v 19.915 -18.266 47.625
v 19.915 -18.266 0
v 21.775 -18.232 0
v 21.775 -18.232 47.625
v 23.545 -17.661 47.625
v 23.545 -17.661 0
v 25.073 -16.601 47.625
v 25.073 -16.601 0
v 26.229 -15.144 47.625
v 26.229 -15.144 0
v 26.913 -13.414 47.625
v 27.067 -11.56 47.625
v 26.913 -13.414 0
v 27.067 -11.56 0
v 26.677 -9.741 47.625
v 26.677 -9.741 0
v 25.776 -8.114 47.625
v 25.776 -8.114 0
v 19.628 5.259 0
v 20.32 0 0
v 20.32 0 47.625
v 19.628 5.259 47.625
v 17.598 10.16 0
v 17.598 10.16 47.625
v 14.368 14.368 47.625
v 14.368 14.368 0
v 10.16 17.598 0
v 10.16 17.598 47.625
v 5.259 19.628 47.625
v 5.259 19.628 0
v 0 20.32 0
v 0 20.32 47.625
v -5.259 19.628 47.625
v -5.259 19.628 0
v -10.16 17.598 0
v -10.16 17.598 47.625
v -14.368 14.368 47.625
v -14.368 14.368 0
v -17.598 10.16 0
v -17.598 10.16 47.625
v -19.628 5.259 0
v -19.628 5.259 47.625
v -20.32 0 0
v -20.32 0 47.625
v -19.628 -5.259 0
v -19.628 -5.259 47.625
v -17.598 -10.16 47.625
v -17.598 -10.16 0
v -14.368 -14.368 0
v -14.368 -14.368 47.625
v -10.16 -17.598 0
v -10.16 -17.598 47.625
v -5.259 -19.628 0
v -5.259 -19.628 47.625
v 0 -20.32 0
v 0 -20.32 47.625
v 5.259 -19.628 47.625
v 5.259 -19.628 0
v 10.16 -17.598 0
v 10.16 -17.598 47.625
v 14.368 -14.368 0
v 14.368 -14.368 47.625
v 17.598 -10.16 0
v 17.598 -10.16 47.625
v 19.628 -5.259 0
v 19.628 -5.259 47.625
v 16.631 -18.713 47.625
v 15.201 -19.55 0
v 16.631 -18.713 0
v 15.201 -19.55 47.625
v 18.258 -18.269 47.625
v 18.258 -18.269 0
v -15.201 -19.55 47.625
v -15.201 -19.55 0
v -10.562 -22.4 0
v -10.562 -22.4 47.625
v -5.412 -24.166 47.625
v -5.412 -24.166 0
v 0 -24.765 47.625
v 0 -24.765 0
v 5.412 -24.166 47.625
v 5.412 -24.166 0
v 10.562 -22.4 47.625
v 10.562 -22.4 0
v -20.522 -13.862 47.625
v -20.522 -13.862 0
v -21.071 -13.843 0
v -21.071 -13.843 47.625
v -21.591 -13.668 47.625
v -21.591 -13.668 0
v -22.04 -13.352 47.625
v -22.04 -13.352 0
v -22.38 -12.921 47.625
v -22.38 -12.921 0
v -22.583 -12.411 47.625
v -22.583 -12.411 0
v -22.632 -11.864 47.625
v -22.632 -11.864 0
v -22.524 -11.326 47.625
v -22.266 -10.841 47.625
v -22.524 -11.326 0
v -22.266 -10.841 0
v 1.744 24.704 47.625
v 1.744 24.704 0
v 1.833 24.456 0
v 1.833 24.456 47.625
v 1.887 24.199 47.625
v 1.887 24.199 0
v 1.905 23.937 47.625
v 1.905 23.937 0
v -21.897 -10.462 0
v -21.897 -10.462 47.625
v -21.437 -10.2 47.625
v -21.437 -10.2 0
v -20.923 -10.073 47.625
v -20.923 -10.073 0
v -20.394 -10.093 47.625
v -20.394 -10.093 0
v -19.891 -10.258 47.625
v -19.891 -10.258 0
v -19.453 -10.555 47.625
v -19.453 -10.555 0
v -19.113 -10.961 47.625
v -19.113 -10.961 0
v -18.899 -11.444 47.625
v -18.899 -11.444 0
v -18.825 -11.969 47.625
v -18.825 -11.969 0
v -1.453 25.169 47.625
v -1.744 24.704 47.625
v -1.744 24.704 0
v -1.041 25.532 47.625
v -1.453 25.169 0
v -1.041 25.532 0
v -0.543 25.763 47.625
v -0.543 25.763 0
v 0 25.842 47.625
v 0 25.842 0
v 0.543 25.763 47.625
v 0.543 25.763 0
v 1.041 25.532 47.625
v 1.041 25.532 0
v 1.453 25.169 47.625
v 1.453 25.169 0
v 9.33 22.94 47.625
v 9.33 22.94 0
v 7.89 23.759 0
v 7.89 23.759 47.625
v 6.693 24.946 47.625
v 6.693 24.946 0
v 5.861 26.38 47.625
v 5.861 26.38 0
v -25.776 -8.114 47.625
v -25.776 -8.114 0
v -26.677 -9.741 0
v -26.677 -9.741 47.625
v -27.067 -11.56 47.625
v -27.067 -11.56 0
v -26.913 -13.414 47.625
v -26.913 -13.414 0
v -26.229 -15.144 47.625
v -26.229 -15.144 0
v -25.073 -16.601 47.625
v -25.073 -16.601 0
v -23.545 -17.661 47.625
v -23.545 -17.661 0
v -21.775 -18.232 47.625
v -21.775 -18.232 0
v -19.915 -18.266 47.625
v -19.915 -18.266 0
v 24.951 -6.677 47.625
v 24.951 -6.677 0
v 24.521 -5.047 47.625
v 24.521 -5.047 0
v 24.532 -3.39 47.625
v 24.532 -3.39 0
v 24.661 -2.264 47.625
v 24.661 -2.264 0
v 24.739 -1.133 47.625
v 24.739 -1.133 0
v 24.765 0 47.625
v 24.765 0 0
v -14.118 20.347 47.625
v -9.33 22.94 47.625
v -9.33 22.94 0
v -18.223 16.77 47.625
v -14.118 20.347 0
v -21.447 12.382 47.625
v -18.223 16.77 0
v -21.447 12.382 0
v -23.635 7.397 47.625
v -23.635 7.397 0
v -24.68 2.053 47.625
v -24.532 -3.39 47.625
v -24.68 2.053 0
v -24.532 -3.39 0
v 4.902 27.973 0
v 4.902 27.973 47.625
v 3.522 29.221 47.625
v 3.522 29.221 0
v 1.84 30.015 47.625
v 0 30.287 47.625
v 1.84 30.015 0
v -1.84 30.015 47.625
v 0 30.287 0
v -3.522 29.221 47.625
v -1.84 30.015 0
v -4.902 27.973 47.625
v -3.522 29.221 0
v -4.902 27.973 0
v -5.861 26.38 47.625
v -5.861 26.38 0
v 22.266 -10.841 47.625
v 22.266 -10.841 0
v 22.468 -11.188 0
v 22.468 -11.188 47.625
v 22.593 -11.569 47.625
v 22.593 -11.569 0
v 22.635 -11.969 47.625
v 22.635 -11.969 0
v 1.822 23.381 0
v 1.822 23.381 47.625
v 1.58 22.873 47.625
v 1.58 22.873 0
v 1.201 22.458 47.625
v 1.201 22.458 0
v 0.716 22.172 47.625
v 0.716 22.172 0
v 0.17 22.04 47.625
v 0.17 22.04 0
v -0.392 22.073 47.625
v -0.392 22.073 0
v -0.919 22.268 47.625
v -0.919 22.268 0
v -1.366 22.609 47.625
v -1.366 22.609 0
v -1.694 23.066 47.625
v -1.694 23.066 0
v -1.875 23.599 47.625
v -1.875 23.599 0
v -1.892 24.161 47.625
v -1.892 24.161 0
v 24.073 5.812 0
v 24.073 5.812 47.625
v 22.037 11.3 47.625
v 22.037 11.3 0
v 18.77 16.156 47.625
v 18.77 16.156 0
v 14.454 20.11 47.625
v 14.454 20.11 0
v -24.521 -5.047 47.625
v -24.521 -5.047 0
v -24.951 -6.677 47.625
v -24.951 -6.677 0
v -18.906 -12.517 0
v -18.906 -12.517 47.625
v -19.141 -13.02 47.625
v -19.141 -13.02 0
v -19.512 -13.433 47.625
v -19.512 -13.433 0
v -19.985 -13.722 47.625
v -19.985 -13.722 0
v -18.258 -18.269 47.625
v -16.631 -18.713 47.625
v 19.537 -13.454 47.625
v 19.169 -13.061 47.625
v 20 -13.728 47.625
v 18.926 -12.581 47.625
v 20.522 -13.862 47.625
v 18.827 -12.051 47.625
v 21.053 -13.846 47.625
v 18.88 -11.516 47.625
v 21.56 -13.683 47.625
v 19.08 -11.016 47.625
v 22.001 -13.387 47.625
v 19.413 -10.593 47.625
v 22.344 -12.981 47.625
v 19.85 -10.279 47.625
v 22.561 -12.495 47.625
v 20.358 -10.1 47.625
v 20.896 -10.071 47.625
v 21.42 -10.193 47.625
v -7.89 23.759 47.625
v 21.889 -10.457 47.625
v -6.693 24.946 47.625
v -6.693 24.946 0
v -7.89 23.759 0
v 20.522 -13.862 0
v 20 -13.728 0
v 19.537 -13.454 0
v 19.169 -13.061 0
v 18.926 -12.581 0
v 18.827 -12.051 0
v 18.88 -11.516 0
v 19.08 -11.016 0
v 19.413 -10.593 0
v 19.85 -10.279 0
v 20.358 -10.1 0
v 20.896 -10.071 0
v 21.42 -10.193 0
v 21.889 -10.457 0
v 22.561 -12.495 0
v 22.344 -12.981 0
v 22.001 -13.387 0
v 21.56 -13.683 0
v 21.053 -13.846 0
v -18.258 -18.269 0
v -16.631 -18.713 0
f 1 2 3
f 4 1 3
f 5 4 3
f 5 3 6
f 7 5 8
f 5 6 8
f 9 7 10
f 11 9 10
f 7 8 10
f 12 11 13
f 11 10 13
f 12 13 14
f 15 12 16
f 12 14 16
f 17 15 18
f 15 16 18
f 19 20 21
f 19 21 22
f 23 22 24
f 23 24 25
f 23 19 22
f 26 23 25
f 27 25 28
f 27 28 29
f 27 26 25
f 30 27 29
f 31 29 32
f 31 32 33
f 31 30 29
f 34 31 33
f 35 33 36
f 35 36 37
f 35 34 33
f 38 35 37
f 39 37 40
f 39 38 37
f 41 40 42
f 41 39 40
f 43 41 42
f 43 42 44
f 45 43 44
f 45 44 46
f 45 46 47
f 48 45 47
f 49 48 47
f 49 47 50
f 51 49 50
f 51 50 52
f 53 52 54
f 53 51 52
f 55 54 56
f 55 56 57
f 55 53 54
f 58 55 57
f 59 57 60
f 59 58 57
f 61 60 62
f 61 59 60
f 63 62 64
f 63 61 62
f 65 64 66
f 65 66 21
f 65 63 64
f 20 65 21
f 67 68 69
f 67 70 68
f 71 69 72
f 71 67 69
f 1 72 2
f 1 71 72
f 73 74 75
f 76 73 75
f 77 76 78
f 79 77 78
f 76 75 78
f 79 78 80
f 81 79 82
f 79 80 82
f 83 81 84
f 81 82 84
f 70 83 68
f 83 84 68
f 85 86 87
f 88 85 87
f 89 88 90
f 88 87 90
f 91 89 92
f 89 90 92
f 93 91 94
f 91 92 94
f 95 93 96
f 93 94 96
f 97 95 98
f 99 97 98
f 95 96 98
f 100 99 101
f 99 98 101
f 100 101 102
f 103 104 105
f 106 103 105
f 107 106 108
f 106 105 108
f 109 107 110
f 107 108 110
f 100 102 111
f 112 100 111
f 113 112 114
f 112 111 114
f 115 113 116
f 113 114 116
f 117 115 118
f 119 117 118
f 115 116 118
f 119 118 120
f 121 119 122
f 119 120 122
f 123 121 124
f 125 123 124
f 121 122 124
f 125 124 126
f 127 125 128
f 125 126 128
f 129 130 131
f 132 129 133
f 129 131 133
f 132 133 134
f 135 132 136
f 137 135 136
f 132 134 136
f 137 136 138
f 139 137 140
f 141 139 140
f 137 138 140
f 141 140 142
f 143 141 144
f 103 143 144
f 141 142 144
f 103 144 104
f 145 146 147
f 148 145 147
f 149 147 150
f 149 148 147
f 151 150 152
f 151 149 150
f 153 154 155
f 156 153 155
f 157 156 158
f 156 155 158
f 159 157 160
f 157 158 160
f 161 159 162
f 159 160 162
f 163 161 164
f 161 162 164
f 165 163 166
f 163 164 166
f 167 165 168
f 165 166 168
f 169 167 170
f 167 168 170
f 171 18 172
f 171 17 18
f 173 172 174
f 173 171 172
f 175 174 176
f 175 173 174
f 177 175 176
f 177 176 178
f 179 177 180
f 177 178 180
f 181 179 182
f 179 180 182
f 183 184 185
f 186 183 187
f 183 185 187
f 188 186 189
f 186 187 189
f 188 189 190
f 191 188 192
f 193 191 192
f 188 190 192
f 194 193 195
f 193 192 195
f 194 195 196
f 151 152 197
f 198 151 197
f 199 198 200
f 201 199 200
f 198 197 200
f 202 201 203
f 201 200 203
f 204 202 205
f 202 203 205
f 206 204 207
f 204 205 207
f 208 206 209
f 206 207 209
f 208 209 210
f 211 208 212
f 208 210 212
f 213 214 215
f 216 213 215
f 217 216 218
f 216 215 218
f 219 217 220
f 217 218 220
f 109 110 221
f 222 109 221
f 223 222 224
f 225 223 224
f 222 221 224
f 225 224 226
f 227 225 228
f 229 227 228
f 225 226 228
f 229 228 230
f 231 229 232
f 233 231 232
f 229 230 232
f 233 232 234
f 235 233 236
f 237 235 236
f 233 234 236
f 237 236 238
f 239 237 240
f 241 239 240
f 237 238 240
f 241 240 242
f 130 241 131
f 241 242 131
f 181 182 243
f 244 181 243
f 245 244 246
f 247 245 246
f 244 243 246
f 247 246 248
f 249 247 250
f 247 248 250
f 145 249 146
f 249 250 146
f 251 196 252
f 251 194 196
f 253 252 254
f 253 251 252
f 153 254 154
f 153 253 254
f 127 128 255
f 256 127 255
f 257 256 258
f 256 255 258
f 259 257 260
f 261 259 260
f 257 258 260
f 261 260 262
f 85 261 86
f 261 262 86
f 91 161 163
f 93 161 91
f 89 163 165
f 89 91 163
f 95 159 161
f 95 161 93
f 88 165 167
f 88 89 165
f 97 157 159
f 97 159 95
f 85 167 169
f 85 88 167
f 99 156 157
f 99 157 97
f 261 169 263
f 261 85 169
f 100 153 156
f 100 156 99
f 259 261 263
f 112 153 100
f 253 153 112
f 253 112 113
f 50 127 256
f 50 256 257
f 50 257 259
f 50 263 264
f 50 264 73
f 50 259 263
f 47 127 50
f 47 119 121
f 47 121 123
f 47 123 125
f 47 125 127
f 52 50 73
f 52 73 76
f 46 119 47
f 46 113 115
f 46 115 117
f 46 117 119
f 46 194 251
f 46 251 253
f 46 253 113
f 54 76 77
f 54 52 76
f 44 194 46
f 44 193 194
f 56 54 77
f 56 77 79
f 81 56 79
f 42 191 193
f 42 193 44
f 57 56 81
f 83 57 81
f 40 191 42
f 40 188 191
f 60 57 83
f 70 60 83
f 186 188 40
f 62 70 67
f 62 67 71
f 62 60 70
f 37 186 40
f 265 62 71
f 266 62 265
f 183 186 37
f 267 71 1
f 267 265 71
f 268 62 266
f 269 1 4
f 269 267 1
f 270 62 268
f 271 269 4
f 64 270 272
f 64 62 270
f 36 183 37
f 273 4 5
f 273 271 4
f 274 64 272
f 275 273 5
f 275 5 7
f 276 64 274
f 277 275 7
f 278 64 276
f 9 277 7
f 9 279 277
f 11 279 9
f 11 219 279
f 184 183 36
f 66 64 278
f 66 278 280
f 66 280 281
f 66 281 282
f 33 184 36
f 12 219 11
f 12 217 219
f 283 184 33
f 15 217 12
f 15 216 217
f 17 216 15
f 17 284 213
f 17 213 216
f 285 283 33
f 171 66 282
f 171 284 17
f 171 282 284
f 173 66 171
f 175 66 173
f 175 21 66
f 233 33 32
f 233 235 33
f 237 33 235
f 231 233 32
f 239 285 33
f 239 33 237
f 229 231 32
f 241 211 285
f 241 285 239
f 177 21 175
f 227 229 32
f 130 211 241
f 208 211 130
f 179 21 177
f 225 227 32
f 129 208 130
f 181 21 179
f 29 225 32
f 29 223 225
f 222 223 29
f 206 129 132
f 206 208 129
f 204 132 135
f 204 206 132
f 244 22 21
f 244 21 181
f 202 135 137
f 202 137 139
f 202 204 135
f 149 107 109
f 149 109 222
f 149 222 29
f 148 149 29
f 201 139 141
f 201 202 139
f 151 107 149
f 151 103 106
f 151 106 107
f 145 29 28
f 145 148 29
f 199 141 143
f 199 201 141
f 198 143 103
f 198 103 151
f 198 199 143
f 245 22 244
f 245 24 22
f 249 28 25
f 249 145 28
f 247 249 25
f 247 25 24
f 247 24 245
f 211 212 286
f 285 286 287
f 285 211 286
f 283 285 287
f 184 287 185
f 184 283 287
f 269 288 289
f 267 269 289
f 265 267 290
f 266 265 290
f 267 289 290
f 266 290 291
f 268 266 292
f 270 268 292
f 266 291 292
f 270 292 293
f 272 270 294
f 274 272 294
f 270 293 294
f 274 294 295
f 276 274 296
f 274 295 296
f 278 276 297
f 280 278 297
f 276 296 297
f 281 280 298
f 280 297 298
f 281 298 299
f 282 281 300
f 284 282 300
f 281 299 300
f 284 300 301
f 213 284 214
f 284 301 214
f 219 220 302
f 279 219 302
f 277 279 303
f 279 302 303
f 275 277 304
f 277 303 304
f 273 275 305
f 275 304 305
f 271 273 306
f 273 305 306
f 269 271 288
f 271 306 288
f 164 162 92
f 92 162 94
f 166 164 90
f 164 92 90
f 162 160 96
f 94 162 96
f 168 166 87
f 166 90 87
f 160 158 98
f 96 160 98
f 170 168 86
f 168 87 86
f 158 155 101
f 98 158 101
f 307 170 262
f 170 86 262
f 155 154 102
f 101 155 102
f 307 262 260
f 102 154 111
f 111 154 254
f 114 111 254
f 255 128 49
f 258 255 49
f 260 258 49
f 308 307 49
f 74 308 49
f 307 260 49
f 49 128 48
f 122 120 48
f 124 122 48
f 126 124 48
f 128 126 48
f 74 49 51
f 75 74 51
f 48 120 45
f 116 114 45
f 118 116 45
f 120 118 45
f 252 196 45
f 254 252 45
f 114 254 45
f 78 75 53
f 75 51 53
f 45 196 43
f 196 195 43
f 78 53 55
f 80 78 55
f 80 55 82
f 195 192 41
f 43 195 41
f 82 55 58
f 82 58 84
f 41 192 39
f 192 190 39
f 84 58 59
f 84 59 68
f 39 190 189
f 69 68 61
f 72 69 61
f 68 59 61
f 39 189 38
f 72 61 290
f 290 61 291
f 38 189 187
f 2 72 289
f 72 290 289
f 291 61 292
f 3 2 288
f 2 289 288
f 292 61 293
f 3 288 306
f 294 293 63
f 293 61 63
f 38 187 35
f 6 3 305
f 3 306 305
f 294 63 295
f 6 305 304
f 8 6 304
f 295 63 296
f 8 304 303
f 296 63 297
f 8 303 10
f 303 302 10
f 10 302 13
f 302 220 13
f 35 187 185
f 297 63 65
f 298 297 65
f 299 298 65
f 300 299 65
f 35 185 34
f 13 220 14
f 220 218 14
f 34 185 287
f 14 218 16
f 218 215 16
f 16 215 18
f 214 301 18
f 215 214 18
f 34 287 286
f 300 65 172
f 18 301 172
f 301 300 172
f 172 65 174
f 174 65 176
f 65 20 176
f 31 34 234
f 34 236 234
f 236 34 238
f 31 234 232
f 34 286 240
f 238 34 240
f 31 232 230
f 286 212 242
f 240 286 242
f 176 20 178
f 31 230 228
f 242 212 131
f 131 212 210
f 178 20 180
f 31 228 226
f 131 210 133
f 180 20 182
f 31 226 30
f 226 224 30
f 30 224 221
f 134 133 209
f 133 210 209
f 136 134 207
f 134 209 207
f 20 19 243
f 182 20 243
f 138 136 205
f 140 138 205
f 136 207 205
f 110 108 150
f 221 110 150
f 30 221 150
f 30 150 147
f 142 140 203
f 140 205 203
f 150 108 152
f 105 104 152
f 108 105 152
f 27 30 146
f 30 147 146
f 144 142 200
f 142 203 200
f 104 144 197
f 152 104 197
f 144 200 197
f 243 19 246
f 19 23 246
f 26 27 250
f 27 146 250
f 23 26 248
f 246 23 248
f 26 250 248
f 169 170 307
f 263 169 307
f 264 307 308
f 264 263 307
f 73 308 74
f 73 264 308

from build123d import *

# Parameters (mm, degrees)
F0_R     = 20.32
F1_DEPTH = 47.625
F2_R     = 6.35


with BuildPart() as f1:
    # F0 (on Top) → F1 (new body)
    with BuildSketch(Plane.XY):
        with BuildLine():
            ThreePointArc((23.9050999455, -6.4692674698), (24.5490837421, -3.2630832697), (24.765, 0))
            ThreePointArc((24.765, 0), (19.6285885254, 15.1004548773), (6.35, 23.9370575677))
            ThreePointArc((6.35, 23.9370575677), (4.0651088886, 24.4290833787), (1.7440091422, 24.703515076))
            ThreePointArc((1.7440091422, 24.703515076), (1.8643178935, 24.3286489263), (1.905, 23.9370575677))
            ThreePointArc((1.905, 23.9370575677), (-0.3915913586, 22.0727396742), (-1.7440091422, 24.703515076))
            ThreePointArc((-1.7440091422, 24.703515076), (-4.0651088886, 24.4290833787), (-6.35, 23.9370575677))
            ThreePointArc((-6.35, 23.9370575677), (-21.4471191247, 12.3825), (-23.9050999455, -6.4692674698))
            ThreePointArc((-23.9050999455, -6.4692674698), (-23.1887612414, -8.6940541227), (-22.2658761897, -10.8414013165))
            ThreePointArc((-22.2658761897, -10.8414013165), (-20.1370690632, -10.1581864481), (-18.8250999455, -11.9685287839))
            ThreePointArc((-18.8250999455, -11.9685287839), (-19.3113489683, -13.239815795), (-20.5218670475, -13.8621137596))
            ThreePointArc((-20.5218670475, -13.8621137596), (-19.1236523528, -15.735029256), (-17.5550999455, -17.4677900979))
            ThreePointArc((-17.5550999455, -17.4677900979), (0, -24.765), (17.5550999455, -17.4677900979))
            ThreePointArc((17.5550999455, -17.4677900979), (19.1236523528, -15.735029256), (20.5218670475, -13.8621137596))
            ThreePointArc((20.5218670475, -13.8621137596), (19.0803215513, -11.0160287839), (22.2658761897, -10.8414013165))
            ThreePointArc((22.2658761897, -10.8414013165), (23.1887612414, -8.6940541227), (23.9050999455, -6.4692674698))
        make_face()
        Circle(F0_R, mode=Mode.SUBTRACT)
        with BuildLine():
            ThreePointArc((-22.2658761897, -10.8414013165), (-23.1887612414, -8.6940541227), (-23.9050999455, -6.4692674698))
            ThreePointArc((-23.9050999455, -6.4692674698), (-26.2293612595, -15.1435287839), (-17.5550999455, -17.4677900979))
            ThreePointArc((-17.5550999455, -17.4677900979), (-19.1236523528, -15.735029256), (-20.5218670475, -13.8621137596))
            ThreePointArc((-20.5218670475, -13.8621137596), (-22.3798783397, -12.9210287839), (-22.2658761897, -10.8414013165))
        make_face()
        with BuildLine():
            ThreePointArc((1.7440091422, 24.703515076), (4.0651088886, 24.4290833787), (6.35, 23.9370575677))
            ThreePointArc((6.35, 23.9370575677), (0, 30.2870575677), (-6.35, 23.9370575677))
            ThreePointArc((-6.35, 23.9370575677), (-4.0651088886, 24.4290833787), (-1.7440091422, 24.703515076))
            ThreePointArc((-1.7440091422, 24.703515076), (0, 25.8420575677), (1.7440091422, 24.703515076))
        make_face()
        with BuildLine():
            ThreePointArc((17.5550999455, -17.4677900979), (26.2293612595, -15.1435287839), (23.9050999455, -6.4692674698))
            ThreePointArc((23.9050999455, -6.4692674698), (23.1887612414, -8.6940541227), (22.2658761897, -10.8414013165))
            ThreePointArc((22.2658761897, -10.8414013165), (22.5404422812, -11.3754979015), (22.6350999455, -11.9685287839))
            ThreePointArc((22.6350999455, -11.9685287839), (22.0013869566, -13.3872797611), (20.5218670475, -13.8621137596))
            ThreePointArc((20.5218670475, -13.8621137596), (19.1236523528, -15.735029256), (17.5550999455, -17.4677900979))
        make_face()
    extrude(amount=F1_DEPTH)

    # F2
    f2_edges = [f1.edges().sort_by_distance(p)[0] for p in [
        (6.35, 23.937058, 23.8125),
        (-23.9051, -6.469267, 23.8125),
        (17.5551, -17.46779, 23.8125),
        (23.9051, -6.469267, 23.8125),
        (-6.35, 23.937058, 23.8125),
        (-17.5551, -17.46779, 23.8125),
    ]]
    fillet(f2_edges, radius=F2_R)


solid = f1.part
